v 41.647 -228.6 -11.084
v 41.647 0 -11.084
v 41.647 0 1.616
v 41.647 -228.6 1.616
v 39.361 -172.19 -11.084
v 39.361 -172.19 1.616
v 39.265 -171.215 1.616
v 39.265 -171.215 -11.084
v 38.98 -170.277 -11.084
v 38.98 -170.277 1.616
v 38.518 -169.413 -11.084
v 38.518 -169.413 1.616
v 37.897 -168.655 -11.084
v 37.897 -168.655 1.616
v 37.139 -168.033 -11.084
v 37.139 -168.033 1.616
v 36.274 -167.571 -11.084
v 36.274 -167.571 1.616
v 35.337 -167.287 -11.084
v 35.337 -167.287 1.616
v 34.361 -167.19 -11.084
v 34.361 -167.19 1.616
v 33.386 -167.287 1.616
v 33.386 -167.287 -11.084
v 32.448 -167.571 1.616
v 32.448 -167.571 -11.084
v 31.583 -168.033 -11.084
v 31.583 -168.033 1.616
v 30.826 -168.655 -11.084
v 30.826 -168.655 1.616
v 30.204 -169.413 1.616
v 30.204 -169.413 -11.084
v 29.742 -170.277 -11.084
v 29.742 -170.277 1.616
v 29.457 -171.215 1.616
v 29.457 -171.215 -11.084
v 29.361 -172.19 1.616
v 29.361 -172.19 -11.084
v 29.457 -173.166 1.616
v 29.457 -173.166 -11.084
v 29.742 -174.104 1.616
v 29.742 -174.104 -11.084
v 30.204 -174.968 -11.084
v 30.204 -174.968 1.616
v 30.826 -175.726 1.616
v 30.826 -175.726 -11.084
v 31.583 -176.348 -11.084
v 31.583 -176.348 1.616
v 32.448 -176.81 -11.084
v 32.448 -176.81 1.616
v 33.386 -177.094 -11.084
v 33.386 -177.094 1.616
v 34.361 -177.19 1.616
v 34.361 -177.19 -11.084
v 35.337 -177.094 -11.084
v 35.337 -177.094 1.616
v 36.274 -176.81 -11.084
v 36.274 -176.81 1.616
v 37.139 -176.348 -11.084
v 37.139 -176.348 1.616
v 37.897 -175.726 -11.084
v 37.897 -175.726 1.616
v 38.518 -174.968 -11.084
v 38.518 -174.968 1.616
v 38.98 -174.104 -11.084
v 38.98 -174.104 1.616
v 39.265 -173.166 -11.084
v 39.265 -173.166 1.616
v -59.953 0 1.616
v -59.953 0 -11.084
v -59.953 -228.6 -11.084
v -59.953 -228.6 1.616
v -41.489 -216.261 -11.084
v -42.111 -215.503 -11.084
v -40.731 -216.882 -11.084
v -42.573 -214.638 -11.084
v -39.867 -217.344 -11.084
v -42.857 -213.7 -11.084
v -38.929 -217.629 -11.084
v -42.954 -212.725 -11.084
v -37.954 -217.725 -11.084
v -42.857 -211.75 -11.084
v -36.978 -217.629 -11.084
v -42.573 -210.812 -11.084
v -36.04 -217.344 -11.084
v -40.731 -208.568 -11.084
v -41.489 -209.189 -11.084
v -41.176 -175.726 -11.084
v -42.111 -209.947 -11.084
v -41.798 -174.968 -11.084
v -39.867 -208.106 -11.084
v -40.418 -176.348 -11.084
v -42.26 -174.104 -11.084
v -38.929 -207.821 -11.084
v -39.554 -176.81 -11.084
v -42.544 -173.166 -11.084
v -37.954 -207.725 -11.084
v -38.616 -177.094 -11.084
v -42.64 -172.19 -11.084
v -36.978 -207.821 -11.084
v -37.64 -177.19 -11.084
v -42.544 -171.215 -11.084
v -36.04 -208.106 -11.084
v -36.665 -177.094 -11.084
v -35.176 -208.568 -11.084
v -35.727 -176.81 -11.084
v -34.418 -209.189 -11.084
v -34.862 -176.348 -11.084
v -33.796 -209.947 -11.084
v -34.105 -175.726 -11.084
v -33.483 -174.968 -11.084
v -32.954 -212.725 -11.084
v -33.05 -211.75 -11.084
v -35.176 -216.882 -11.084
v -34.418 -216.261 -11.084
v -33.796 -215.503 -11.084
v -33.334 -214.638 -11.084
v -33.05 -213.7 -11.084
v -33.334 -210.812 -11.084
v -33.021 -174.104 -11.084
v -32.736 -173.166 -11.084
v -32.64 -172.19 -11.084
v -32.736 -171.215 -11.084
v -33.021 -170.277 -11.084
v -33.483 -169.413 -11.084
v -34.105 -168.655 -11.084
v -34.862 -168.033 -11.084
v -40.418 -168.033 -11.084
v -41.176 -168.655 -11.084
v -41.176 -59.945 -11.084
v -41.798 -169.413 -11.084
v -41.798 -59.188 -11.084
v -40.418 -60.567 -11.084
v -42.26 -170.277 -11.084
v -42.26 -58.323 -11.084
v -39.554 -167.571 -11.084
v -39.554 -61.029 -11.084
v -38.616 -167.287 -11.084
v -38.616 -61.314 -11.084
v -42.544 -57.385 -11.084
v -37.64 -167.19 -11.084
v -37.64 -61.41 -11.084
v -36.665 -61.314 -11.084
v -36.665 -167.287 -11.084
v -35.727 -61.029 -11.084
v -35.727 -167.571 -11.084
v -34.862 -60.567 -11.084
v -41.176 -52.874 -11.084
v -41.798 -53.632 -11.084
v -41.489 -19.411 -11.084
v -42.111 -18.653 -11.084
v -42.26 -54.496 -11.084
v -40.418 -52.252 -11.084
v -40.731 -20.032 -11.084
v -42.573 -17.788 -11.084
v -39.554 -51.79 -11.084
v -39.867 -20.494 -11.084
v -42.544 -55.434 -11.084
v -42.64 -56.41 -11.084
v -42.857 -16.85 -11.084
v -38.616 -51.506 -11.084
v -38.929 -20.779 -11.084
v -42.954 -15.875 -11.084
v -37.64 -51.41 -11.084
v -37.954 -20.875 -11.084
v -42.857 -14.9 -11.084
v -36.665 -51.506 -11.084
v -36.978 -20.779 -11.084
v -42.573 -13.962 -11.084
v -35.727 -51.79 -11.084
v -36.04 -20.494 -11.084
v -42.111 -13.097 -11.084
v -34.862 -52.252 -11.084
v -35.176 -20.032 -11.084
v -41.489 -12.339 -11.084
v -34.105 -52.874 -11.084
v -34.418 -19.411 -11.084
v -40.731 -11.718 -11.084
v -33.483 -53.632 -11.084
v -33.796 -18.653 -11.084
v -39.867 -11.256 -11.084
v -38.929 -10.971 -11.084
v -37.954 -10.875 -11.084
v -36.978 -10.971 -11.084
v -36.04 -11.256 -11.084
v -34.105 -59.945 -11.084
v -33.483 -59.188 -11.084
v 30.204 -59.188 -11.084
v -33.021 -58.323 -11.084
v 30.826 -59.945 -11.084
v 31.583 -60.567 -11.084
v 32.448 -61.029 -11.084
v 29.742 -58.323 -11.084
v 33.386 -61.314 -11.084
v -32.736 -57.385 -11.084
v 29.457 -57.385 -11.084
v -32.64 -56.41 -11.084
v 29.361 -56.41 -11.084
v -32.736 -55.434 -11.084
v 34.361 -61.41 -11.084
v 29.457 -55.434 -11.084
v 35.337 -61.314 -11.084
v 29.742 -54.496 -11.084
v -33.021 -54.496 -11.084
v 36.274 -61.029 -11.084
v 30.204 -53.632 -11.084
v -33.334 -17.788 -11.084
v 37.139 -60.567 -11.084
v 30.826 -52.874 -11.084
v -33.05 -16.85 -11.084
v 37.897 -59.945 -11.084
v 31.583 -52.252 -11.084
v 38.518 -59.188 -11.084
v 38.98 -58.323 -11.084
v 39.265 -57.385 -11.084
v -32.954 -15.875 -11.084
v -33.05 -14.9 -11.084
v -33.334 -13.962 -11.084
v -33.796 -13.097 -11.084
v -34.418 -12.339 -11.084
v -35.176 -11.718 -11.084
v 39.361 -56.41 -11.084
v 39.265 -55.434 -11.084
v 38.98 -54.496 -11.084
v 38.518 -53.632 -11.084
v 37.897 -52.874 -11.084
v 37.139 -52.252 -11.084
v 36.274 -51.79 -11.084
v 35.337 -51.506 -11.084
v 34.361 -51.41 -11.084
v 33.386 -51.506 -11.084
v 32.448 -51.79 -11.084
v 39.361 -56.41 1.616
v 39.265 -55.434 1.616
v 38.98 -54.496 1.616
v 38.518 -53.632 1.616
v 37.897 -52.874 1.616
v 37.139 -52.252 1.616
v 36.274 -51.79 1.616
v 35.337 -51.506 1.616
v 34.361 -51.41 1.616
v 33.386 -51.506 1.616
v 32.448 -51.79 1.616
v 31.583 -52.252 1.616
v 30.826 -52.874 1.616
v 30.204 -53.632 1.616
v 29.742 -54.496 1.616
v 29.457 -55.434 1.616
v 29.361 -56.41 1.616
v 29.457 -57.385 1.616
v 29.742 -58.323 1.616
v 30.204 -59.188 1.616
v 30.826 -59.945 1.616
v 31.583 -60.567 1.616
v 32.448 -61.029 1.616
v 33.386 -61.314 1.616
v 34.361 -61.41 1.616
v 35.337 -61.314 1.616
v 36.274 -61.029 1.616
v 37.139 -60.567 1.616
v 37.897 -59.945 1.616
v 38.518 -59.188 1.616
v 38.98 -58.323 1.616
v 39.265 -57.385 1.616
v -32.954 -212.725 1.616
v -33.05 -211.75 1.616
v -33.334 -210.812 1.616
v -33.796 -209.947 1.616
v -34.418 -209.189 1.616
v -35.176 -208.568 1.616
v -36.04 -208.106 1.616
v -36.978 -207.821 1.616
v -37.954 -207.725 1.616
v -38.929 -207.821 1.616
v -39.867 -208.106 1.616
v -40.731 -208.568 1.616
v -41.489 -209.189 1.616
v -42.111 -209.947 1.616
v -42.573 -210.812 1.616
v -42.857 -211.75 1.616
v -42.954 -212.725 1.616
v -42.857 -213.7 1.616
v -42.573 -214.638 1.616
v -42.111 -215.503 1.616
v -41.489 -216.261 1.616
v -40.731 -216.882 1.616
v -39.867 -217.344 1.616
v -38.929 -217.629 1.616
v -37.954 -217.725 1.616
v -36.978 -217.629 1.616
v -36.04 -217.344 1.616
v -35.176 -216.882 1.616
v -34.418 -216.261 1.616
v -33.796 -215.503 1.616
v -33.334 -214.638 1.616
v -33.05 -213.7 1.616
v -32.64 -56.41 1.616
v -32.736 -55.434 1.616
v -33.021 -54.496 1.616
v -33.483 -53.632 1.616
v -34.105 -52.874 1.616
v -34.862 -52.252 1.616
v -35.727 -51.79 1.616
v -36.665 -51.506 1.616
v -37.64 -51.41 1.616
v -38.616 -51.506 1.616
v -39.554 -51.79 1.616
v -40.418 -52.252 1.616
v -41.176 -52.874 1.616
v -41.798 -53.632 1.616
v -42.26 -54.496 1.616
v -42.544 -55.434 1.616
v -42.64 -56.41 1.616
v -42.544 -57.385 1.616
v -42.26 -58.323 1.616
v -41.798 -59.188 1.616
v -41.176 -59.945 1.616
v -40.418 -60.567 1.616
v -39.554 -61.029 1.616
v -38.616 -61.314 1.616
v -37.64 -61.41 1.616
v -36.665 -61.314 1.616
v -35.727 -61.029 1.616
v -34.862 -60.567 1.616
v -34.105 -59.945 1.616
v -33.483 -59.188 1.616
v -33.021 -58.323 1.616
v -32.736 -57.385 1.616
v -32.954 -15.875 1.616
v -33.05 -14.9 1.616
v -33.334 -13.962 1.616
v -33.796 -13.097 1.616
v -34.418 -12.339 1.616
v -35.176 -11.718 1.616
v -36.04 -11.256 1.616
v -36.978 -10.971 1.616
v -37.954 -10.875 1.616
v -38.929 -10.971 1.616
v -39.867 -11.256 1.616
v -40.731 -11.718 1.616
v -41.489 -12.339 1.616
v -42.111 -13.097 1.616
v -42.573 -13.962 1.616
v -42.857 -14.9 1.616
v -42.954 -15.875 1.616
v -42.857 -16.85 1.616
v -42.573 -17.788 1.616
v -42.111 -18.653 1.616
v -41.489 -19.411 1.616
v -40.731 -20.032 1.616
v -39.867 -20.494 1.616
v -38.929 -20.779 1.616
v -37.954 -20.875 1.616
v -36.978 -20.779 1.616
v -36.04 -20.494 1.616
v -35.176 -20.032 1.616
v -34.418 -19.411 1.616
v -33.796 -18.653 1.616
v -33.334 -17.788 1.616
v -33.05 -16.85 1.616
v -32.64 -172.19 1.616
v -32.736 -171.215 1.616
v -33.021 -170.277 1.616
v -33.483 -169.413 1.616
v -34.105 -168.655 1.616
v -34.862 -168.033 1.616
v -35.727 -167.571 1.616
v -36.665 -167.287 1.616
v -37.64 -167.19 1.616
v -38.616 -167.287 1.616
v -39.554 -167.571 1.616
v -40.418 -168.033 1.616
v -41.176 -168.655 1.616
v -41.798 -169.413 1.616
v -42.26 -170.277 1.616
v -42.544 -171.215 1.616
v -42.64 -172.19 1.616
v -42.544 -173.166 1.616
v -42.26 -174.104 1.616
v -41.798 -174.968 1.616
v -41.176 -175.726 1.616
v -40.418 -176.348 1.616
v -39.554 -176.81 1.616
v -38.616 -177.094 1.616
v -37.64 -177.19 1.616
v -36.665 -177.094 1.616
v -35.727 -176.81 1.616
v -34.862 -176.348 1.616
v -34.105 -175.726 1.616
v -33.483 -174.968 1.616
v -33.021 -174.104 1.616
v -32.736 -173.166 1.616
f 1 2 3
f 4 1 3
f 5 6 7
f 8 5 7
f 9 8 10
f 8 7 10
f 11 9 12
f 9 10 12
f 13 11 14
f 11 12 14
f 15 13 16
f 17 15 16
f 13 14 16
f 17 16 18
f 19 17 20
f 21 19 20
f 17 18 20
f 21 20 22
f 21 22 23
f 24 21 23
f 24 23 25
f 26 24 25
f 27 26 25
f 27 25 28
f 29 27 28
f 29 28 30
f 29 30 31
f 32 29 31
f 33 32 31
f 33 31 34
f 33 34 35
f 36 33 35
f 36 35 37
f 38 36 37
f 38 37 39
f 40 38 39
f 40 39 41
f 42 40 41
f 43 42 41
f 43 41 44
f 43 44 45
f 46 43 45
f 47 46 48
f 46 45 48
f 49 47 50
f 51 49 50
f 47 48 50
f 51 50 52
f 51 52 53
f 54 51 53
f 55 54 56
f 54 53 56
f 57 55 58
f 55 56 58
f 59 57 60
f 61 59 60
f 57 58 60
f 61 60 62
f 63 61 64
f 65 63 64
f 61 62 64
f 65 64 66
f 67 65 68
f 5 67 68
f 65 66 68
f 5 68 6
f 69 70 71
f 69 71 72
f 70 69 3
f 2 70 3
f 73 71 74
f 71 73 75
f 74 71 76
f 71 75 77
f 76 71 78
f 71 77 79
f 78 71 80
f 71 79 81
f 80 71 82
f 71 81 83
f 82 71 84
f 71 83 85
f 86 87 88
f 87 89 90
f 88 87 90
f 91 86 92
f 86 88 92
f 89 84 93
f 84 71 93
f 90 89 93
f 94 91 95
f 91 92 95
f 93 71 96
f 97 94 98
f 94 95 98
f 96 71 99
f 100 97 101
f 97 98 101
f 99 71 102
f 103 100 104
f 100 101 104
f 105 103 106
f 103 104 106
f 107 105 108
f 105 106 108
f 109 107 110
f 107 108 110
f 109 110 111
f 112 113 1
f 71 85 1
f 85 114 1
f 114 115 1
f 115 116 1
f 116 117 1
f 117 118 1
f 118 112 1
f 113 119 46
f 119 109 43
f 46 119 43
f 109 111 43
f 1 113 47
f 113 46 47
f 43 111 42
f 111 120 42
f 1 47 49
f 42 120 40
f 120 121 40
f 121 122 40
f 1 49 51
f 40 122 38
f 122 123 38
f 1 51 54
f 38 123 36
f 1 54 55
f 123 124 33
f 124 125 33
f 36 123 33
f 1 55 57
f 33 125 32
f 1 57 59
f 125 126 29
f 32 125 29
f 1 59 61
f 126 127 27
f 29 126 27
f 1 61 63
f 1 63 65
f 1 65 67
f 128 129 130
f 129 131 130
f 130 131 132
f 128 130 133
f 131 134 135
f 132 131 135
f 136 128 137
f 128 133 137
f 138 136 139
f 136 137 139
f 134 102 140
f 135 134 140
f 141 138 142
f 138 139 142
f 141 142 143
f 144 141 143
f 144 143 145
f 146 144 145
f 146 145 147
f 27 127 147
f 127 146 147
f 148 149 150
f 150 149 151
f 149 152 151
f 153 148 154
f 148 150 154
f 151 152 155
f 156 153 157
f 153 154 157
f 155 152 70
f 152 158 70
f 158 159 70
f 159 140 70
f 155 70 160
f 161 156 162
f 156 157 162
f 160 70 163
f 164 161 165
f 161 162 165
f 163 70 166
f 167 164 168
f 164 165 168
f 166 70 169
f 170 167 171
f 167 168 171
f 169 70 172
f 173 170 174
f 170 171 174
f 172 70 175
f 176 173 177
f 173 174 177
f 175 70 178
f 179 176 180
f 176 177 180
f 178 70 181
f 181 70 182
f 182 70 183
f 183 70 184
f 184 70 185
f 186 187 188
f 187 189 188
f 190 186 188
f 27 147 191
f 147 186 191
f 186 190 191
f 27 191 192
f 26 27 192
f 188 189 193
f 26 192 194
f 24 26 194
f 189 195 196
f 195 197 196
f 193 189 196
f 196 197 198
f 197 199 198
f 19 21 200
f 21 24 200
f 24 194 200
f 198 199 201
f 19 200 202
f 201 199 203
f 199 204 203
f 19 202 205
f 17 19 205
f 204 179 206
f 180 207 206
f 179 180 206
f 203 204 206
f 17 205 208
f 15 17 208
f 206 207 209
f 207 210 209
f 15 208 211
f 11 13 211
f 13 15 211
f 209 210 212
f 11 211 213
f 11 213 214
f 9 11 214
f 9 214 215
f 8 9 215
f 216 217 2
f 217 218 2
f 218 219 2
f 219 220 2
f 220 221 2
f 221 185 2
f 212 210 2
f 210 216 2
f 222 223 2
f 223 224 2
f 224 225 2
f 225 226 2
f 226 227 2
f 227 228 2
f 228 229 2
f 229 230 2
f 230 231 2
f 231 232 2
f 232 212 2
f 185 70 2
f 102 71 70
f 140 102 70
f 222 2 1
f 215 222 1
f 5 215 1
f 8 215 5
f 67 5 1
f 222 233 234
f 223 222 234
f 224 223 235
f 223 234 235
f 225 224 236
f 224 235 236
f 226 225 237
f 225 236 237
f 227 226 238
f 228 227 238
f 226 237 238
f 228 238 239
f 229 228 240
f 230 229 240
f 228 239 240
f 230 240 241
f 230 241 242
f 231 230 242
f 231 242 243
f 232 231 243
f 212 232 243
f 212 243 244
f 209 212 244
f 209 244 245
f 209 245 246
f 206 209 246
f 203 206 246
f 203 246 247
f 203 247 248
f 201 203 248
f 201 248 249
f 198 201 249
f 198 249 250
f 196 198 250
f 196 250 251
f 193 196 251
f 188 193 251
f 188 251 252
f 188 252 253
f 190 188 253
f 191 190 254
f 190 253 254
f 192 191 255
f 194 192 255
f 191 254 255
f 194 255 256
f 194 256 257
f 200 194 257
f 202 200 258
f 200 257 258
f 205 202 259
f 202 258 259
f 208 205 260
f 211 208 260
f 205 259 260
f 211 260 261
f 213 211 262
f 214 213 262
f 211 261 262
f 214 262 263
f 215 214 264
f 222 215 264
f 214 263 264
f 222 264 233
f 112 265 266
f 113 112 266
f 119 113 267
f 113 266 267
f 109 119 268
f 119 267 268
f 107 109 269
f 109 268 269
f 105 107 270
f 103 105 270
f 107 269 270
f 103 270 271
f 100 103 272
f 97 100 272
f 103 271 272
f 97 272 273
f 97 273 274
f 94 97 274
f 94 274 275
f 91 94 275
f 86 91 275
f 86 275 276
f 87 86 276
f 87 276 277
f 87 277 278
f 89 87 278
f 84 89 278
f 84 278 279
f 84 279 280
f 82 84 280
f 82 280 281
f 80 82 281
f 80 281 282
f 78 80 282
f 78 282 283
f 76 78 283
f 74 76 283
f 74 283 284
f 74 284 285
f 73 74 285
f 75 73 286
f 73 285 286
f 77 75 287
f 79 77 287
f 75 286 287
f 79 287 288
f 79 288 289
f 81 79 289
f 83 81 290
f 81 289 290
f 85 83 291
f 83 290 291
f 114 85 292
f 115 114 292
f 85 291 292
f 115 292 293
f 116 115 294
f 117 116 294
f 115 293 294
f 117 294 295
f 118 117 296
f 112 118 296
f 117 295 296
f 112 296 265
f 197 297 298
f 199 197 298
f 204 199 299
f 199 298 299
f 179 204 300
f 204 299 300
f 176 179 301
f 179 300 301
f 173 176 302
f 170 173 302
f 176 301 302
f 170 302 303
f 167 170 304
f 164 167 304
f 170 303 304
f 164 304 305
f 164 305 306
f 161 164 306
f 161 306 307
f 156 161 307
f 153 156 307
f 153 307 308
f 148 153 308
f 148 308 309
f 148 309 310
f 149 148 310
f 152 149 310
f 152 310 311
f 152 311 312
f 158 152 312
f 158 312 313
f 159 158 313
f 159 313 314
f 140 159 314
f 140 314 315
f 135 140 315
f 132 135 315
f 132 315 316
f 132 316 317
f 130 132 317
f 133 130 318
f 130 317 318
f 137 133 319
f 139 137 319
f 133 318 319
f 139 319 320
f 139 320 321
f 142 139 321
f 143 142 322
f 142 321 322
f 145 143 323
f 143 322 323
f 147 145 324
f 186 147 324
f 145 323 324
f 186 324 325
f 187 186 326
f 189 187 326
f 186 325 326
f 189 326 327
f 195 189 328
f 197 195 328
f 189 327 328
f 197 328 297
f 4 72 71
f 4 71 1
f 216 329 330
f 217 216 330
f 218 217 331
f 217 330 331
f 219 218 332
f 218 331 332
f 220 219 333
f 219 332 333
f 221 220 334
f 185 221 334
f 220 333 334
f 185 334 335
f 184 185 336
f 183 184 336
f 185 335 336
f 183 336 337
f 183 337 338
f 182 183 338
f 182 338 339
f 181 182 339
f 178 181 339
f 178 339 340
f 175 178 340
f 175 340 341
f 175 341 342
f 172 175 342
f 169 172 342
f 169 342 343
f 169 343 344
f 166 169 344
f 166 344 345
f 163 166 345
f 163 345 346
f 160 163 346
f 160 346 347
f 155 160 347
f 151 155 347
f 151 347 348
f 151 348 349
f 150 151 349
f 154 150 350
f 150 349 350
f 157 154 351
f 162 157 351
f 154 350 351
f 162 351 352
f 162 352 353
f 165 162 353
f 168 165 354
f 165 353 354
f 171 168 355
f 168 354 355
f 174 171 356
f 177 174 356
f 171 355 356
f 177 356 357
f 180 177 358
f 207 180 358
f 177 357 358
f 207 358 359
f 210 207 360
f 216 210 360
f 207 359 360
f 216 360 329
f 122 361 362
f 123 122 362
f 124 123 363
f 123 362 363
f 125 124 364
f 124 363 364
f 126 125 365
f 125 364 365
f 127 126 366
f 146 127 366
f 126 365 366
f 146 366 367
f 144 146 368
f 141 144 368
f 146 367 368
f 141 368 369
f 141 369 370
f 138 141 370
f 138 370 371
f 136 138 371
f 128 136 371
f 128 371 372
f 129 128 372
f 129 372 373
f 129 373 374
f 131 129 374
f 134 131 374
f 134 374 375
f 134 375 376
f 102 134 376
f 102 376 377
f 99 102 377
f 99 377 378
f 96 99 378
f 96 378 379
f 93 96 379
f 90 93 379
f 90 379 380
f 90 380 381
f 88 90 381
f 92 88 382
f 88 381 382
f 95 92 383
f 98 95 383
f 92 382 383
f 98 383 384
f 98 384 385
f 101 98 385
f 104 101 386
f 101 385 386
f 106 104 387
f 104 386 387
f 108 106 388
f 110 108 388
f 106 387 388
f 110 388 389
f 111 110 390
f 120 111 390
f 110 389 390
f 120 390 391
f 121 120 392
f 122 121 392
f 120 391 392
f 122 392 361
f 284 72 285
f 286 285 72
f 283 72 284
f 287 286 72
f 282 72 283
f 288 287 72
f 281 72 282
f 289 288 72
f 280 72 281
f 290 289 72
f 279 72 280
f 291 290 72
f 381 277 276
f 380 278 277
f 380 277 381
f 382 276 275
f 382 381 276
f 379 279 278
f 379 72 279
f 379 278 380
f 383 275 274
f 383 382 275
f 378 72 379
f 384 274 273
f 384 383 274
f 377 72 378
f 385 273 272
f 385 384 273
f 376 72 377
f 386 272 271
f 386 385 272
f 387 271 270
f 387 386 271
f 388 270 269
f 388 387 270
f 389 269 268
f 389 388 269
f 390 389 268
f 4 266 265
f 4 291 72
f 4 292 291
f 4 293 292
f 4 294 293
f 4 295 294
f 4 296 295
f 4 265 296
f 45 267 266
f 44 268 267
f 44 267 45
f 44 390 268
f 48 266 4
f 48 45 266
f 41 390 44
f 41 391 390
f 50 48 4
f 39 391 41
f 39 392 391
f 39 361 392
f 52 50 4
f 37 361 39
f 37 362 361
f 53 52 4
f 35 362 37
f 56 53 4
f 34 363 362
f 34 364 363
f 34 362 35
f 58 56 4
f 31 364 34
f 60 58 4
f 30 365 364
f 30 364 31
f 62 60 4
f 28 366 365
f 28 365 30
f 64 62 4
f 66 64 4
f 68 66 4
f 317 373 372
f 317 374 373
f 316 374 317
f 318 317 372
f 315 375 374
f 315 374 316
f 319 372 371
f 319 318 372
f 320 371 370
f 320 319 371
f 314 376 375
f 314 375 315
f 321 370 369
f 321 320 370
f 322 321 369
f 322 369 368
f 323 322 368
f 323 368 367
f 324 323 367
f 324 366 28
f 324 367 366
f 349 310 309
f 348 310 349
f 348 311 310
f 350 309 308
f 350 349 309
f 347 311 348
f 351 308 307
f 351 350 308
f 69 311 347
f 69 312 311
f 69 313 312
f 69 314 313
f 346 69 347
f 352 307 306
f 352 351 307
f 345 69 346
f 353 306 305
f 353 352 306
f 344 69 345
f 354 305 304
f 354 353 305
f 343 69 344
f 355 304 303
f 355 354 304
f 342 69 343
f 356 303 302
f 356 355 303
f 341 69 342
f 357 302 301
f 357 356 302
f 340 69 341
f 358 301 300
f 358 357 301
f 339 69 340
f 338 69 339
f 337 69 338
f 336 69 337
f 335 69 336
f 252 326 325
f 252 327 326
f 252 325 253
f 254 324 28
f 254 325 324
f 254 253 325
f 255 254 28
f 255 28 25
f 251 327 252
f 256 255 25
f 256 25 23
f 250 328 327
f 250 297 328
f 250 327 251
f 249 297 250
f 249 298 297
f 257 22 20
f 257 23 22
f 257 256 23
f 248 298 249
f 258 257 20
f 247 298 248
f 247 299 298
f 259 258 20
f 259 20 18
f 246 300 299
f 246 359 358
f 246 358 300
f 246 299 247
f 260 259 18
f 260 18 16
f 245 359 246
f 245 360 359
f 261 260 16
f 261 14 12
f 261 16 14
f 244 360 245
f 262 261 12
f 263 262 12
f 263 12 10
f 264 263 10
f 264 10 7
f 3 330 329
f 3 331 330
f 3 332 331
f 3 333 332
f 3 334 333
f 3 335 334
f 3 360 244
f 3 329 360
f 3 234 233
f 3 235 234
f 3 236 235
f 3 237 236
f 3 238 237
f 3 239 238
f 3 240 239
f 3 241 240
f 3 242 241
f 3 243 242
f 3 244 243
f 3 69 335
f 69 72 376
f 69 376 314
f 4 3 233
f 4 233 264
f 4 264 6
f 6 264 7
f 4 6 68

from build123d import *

# Parameters (mm, degrees)
F0_W     = 101.6
F0_H     = 12.7
F1_DEPTH = 228.6
F2_R     = 5
F3_DEPTH = 12.701


with BuildPart() as f1:
    # F0 (on Front) → F1 (new body)
    with BuildSketch(Plane.XZ):
        with Locations((-9.152951, -4.734359)):
            Rectangle(F0_W, F0_H)
    extrude(amount=F1_DEPTH)

    # F2 (on face) → F3 (cut, through all)
    with BuildSketch(Plane.XY.offset(1.615641)):
        with Locations((34.361049, -56.4097)):
            Circle(F2_R)
        with Locations((34.361049, -172.1905)):
            Circle(F2_R)
        with Locations((-37.640351, -56.4097)):
            Circle(F2_R)
        with Locations((-37.640351, -172.1905)):
            Circle(F2_R)
        with Locations((-37.953511, -212.725)):
            Circle(F2_R)
        with Locations((-37.953511, -15.875)):
            Circle(F2_R)
    extrude(amount=-F3_DEPTH, mode=Mode.SUBTRACT)


solid = f1.part
